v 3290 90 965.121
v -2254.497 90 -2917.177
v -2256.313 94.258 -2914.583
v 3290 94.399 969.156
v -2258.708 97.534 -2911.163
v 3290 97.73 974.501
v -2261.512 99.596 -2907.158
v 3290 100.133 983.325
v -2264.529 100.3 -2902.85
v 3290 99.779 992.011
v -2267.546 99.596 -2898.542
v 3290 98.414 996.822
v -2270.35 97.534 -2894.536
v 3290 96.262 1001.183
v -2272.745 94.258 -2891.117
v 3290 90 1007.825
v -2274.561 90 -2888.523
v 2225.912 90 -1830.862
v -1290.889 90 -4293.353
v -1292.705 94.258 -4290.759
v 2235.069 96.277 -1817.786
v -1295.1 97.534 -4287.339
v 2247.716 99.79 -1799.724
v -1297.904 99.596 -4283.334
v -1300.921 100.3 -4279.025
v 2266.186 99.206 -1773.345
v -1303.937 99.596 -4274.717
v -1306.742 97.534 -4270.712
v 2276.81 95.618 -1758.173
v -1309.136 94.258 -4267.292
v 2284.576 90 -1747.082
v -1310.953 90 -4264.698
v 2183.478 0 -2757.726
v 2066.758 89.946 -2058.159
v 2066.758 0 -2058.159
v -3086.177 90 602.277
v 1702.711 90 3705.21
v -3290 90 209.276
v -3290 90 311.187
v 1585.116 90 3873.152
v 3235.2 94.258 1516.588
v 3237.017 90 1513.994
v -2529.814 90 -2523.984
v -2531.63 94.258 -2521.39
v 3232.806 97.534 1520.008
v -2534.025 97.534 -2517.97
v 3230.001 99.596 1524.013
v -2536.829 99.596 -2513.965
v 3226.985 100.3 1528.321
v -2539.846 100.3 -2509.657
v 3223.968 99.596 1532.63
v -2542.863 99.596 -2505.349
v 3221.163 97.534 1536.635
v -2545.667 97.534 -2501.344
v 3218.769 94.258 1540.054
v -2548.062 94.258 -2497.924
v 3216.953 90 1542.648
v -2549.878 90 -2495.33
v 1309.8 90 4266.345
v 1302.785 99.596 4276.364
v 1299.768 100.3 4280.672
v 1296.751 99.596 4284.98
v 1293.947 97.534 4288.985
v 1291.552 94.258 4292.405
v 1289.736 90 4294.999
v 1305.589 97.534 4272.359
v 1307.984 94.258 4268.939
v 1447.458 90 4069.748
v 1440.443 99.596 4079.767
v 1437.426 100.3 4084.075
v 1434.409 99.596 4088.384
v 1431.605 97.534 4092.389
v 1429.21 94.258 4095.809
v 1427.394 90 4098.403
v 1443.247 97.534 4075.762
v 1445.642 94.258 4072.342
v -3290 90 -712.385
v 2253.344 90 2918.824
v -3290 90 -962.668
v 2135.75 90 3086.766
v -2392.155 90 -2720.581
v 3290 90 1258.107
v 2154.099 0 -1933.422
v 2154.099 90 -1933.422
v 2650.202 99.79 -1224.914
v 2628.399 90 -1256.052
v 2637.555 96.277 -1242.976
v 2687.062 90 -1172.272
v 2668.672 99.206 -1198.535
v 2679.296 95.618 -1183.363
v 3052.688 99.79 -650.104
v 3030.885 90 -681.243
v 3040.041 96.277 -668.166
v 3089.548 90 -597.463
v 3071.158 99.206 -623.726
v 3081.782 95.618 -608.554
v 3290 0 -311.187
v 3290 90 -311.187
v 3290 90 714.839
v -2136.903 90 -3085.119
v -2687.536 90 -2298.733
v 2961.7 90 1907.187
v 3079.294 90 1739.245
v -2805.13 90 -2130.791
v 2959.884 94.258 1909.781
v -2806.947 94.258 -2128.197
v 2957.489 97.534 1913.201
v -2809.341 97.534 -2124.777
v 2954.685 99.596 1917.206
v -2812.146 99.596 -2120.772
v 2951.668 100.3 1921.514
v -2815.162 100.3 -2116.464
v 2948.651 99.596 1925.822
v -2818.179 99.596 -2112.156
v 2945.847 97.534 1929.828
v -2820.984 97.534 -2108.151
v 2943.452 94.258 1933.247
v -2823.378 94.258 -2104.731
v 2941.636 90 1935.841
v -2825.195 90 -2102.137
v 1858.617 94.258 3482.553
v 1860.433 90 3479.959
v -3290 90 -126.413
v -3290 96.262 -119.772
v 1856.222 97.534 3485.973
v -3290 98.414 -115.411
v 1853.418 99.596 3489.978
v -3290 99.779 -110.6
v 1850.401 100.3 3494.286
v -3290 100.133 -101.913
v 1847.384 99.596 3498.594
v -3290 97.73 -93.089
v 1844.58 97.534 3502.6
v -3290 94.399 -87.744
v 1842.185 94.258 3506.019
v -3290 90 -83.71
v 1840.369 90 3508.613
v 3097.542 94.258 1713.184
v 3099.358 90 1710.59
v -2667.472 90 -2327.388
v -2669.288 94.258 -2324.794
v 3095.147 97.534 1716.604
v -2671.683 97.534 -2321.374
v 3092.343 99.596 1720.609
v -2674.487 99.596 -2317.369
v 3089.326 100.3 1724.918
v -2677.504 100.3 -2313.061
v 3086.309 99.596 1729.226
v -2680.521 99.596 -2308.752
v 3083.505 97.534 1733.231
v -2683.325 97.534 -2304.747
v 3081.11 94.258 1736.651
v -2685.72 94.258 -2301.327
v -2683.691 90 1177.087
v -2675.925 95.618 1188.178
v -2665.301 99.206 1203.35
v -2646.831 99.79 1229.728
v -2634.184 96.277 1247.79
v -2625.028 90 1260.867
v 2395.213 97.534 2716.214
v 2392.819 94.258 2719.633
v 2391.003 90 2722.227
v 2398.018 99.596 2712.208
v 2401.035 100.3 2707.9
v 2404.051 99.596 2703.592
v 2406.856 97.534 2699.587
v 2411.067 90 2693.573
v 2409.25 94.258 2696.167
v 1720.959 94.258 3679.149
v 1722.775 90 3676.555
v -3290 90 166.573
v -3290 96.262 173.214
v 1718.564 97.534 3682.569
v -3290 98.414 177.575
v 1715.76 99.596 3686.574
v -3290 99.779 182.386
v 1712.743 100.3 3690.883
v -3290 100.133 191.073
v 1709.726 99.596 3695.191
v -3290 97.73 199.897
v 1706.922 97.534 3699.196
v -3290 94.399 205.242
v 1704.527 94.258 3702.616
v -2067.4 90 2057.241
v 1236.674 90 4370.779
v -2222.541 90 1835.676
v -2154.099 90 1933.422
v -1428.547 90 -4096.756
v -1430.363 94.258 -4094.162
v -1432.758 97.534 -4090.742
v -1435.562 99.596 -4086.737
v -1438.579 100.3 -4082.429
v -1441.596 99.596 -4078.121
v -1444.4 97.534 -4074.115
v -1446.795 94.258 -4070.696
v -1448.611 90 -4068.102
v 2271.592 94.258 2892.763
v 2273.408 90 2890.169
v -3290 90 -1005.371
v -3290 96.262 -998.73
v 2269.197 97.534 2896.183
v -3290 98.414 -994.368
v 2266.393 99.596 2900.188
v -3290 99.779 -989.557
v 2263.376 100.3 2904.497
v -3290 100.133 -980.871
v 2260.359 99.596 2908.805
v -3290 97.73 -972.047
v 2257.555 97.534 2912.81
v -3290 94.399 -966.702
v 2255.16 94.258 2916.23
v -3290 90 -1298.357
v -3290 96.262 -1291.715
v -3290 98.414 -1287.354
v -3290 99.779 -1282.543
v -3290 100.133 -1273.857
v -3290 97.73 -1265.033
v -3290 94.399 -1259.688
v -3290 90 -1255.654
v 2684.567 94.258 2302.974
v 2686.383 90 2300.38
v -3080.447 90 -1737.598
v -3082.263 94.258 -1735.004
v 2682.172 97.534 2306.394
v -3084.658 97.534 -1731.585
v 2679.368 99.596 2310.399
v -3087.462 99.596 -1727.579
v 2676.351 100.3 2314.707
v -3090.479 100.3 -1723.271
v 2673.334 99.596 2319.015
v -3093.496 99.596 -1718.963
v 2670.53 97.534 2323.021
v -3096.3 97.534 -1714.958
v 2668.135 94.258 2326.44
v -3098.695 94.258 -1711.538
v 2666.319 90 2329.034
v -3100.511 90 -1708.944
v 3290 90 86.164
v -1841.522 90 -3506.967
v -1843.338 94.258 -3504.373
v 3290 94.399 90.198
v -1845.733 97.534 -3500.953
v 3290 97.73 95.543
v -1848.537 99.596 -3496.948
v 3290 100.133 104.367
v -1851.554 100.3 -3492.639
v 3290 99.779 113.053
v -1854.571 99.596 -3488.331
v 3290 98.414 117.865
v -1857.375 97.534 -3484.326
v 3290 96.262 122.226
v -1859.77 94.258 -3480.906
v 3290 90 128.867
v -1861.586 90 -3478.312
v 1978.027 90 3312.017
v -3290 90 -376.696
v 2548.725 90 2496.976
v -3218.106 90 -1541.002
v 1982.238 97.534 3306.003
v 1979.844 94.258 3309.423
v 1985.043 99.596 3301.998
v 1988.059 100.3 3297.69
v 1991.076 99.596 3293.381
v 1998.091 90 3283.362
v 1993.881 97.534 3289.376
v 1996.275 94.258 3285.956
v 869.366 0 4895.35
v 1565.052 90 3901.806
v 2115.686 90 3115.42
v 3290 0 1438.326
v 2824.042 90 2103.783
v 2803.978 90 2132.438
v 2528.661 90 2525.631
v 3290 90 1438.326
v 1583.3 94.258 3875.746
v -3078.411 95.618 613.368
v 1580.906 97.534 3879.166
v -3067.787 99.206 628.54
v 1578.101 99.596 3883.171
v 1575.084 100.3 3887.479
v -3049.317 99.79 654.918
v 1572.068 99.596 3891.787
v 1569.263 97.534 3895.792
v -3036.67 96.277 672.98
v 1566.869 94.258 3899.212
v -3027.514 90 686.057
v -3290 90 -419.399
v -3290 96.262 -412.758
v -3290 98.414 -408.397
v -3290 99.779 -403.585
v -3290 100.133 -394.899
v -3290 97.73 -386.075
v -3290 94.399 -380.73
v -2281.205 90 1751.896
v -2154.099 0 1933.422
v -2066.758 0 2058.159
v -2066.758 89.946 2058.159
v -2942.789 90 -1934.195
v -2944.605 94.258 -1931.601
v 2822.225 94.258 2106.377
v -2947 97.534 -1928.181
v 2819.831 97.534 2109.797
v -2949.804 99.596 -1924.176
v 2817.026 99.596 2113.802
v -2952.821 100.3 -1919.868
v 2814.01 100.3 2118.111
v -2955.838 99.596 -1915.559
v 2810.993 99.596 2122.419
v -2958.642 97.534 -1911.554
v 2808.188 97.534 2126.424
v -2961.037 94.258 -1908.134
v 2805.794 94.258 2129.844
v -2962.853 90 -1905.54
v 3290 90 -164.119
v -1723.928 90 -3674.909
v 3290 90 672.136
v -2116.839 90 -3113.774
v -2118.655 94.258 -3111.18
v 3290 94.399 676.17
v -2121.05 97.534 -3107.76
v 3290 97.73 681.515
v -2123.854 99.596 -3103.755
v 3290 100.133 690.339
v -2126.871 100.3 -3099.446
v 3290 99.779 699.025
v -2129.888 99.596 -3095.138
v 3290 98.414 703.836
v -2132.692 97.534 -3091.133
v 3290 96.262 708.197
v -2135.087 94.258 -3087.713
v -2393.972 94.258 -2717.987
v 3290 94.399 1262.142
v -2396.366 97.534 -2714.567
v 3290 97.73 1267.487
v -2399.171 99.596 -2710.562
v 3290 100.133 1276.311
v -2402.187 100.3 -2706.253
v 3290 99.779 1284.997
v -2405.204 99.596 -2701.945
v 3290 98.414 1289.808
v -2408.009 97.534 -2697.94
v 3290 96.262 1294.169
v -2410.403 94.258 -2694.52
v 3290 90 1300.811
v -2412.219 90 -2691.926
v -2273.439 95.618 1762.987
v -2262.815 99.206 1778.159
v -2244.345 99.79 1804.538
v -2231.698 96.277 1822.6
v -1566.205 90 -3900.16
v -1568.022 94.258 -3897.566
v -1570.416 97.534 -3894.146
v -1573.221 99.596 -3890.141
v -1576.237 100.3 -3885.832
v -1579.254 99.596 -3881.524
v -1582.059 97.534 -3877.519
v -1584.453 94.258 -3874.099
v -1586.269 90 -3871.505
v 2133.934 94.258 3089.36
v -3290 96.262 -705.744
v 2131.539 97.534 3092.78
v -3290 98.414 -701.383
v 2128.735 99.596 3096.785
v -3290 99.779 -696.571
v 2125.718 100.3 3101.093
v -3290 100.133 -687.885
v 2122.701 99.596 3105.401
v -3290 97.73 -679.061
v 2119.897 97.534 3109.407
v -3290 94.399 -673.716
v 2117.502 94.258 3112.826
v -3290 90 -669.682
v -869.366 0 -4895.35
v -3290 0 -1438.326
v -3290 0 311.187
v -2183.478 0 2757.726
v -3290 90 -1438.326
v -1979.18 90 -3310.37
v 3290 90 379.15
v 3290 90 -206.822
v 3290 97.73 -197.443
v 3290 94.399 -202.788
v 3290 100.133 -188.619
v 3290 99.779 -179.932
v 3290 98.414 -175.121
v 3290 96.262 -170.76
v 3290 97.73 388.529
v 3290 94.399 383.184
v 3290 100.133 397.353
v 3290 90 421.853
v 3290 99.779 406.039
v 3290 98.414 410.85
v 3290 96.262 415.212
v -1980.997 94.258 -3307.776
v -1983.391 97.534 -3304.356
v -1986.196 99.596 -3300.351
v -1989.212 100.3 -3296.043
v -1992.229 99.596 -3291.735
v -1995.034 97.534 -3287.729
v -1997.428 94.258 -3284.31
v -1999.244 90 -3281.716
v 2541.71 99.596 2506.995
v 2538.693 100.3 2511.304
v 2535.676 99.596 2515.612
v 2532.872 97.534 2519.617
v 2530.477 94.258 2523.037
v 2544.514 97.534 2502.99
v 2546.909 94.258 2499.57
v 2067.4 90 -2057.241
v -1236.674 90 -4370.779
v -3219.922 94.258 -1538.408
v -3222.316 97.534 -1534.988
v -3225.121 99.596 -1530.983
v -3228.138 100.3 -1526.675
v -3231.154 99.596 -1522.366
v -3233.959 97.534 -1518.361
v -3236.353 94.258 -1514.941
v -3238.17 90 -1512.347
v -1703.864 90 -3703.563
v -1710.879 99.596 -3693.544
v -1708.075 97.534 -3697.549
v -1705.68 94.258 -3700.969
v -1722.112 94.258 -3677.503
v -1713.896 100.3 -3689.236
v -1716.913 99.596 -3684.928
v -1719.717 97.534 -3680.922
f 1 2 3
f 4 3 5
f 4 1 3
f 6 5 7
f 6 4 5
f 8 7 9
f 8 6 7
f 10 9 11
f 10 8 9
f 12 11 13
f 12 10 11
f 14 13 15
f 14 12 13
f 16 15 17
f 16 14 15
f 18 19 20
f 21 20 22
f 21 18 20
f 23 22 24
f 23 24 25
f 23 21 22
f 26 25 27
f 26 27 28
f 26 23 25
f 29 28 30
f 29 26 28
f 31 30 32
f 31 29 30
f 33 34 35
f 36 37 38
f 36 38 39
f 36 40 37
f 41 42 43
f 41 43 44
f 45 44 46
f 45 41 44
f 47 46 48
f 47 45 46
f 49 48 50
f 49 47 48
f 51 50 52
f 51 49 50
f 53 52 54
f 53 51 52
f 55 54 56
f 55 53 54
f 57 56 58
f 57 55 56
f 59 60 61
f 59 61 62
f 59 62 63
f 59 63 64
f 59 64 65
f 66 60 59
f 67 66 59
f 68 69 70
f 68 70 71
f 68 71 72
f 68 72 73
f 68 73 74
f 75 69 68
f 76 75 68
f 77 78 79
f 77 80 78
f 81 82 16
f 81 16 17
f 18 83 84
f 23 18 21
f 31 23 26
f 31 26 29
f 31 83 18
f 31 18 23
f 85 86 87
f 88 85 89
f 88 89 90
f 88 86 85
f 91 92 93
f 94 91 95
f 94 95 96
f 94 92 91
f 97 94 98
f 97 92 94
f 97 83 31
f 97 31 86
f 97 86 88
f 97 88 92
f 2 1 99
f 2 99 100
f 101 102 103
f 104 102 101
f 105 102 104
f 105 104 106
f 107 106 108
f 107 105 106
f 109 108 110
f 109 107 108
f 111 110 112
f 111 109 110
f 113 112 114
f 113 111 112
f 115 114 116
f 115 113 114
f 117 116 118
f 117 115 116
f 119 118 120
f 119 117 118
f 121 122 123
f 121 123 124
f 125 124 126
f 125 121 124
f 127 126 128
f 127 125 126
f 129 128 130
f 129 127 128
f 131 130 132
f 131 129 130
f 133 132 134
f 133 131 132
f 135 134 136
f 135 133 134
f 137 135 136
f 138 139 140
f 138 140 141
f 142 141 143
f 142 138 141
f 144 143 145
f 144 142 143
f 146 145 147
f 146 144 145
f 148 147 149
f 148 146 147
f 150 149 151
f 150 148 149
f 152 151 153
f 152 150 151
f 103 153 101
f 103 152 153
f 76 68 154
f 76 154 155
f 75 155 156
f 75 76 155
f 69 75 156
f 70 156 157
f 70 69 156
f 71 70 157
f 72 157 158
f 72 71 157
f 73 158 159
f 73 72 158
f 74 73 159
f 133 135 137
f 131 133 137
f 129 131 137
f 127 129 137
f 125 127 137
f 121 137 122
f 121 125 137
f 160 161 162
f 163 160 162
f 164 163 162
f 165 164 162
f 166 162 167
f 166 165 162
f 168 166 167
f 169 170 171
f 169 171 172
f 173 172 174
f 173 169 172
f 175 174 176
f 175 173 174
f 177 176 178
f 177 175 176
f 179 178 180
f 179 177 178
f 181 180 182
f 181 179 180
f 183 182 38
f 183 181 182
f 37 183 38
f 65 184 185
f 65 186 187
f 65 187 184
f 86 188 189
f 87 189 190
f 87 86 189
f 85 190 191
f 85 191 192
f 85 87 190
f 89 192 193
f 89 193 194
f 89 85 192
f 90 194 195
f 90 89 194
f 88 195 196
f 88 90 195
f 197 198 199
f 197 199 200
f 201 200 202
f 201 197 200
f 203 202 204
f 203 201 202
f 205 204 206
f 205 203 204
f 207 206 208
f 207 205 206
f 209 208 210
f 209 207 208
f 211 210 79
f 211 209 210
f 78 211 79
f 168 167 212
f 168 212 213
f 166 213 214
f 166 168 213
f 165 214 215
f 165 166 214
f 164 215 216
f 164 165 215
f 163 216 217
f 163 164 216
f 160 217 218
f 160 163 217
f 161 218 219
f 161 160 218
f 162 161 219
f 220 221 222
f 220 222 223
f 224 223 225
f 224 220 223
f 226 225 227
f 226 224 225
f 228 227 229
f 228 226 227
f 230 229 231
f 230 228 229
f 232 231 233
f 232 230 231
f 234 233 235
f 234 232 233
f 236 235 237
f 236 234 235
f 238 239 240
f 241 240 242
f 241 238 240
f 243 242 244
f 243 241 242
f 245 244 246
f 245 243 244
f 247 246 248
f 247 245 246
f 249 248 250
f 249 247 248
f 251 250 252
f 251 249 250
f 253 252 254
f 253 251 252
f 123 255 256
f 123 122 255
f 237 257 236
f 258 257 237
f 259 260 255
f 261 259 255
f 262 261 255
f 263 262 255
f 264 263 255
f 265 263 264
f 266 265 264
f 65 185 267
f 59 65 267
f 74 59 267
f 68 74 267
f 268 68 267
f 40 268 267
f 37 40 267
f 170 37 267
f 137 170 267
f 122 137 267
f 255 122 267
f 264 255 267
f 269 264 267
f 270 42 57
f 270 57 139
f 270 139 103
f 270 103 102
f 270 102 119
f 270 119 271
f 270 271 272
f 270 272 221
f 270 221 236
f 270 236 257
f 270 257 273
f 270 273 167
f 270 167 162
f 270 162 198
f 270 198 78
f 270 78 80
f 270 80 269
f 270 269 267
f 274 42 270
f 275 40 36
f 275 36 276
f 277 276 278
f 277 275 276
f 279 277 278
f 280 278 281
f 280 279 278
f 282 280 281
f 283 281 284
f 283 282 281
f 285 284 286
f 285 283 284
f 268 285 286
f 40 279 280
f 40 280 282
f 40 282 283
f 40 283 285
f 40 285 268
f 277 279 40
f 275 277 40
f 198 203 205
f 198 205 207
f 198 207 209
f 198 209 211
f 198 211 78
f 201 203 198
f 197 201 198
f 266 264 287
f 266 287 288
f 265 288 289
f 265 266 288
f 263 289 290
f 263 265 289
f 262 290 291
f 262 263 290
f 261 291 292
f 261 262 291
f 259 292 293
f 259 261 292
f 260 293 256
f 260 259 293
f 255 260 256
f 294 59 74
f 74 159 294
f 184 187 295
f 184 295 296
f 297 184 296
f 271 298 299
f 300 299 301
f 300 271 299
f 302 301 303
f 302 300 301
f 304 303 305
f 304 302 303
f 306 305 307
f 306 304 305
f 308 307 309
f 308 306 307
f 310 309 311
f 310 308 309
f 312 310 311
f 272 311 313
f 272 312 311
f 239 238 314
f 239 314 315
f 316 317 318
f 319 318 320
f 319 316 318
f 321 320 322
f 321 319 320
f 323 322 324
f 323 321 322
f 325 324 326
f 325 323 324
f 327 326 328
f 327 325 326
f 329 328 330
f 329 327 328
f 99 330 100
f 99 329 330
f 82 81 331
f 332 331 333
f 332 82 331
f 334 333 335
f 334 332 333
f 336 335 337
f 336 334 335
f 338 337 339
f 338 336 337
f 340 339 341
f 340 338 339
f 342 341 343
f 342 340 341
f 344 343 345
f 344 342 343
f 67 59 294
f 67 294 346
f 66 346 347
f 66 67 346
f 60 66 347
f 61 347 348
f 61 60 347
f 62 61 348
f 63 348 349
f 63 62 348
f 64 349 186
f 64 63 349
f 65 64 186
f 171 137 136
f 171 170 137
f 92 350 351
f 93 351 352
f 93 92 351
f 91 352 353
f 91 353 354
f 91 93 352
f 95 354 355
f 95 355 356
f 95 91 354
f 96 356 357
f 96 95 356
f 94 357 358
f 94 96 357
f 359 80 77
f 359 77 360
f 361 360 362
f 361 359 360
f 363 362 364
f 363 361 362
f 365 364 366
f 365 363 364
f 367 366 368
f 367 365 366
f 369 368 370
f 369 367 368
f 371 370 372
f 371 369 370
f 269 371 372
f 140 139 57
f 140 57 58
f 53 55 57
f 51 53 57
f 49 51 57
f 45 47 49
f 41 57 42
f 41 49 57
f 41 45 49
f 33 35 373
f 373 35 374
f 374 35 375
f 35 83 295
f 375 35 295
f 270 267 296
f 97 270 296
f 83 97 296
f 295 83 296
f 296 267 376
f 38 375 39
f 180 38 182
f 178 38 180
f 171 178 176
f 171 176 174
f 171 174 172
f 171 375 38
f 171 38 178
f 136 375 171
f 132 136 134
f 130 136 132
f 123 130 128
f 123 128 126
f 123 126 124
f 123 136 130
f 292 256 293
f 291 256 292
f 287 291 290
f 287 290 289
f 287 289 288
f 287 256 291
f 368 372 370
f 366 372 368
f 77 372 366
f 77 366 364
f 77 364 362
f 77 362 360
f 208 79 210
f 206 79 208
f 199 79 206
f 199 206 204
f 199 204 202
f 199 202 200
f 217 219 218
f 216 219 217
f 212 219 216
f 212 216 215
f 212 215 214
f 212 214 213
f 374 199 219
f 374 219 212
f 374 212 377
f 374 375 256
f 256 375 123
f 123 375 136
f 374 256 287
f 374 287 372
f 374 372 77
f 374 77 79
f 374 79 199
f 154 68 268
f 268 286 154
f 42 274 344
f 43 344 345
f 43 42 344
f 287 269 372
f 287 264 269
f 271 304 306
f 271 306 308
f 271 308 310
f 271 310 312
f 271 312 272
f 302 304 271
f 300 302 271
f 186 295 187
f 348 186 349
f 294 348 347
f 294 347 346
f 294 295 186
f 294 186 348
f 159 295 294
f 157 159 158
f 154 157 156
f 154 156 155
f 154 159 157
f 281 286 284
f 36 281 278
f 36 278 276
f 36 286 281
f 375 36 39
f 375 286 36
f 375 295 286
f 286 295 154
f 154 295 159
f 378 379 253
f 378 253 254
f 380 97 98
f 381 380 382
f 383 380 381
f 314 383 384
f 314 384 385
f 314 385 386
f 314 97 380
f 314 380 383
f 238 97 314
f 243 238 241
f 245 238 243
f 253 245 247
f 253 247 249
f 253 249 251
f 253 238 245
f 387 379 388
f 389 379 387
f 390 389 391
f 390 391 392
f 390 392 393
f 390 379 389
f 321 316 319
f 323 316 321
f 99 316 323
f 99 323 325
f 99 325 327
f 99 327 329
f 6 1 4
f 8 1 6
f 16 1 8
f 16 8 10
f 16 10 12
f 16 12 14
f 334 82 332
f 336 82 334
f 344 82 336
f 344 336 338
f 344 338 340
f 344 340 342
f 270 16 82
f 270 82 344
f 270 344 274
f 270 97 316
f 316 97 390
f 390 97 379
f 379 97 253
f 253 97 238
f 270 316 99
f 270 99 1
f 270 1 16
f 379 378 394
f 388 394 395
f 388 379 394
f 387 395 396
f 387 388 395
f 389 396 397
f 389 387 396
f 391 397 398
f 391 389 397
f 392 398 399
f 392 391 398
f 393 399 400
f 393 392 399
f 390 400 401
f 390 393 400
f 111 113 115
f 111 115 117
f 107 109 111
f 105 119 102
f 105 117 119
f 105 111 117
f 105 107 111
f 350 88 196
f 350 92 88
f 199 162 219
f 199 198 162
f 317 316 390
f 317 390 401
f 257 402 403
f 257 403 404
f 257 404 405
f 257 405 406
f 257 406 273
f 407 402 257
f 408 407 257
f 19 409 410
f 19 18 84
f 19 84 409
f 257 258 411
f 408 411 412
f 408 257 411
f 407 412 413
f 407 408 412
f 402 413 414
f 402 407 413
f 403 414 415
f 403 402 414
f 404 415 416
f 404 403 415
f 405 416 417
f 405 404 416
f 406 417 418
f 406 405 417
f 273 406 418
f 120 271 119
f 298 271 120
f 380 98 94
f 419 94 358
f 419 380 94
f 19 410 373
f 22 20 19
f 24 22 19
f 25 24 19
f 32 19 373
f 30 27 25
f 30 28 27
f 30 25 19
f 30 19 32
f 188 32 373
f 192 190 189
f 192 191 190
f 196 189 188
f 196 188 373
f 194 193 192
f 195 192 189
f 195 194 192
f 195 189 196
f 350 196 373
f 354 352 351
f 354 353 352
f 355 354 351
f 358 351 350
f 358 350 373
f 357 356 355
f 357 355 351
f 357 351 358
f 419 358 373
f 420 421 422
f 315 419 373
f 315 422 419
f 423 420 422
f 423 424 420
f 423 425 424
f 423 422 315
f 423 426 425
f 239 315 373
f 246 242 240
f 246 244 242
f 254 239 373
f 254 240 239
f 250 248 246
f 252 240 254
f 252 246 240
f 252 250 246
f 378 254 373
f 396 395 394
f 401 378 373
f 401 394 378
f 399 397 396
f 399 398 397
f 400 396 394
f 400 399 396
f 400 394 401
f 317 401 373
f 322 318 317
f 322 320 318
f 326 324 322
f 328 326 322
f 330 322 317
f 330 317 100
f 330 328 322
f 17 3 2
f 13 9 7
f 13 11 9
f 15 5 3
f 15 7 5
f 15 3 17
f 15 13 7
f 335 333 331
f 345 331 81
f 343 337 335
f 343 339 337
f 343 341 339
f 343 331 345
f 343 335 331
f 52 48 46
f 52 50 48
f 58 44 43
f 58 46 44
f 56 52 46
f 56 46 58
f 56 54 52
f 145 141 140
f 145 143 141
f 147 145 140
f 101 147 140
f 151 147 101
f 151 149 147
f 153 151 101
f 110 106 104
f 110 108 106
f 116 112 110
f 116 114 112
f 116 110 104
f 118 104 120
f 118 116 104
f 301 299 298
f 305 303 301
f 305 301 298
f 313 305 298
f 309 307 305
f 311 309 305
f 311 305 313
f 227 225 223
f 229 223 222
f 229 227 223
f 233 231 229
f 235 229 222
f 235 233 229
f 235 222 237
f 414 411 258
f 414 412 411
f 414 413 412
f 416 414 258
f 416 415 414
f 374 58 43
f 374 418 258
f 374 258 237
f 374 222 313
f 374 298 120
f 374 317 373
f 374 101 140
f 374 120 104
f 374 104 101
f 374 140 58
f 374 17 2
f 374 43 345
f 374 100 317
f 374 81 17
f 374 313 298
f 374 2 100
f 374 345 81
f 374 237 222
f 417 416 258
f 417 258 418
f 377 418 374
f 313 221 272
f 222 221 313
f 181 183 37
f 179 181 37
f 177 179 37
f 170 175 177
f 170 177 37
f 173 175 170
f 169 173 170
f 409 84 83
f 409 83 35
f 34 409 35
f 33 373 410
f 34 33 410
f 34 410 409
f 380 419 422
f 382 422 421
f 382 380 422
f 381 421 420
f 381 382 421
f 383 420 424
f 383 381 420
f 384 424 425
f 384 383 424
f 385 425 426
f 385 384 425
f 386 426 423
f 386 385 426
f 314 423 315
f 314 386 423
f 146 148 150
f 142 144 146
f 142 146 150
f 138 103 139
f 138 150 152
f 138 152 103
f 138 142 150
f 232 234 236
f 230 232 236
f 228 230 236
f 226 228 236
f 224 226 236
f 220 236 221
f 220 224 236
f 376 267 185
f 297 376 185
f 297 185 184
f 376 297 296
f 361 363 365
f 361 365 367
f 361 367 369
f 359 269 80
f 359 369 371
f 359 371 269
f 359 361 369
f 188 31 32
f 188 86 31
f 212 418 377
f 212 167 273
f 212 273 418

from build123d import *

# Parameters (mm, degrees)
EXTRUDE_1_DEPTH          = 90
EXTRUDE_2_DEPTH          = 90
CUT_EXTRUDE_1_DEPTH      = 7594.314402262
PATTERN_CIRCULAR_2_COUNT = 2
SKETCH_9_R               = 20
EXTRUDE_3_DEPTH          = 8000
PATTERN_LINEAR_1_COUNT   = 24
PATTERN_LINEAR_1_PITCH   = 240
SKETCH_10_W              = 14000
SKETCH_10_H              = 14000
CUT_EXTRUDE_2_DEPTH      = 8000


with BuildPart() as part:
    # 草图2 → 凸台-拉伸1 (new body)
    with BuildSketch(Plane(origin=(0, 0, 0), x_dir=(1, 0, 0), z_dir=(0, 1, 0))):
        Polygon((-2614.527838122, 2403), (1483.472161878, 2403), (2154.099194276, 1933.421896588), (3290, 311.187425036), (3290, -1438.325778405), (2614.527838122, -2403), (-1483.472161878, -2403), (-2154.099194276, -1933.421896588), (-3290, -311.187425036), (-3290, 1438.325778405), align=None)
    extrude(amount=EXTRUDE_1_DEPTH)



with BuildPart() as body_2:
    # 草图5 → 凸台-拉伸2 (new body)
    with BuildSketch(Plane(origin=(0, 90, 0), x_dir=(1, 0, 0), z_dir=(0, 1, 0))):
        Polygon((1236.45451391, -4371.092671119), (2614.527838122, -2403), (-1483.472161878, -2403), (-2154.099194276, -1933.421896588), (-2066.757561129, -2058.158675872), align=None)
        Polygon((869.365594645, -4895.349979464), (1236.45451391, -4371.092671119), (-2066.757561129, -2058.158675872), (-2183.477702067, -2757.726090133), align=None)
    extrude(amount=-EXTRUDE_2_DEPTH)

    # 草图6 → 切除-拉伸1 (cut, through all)
    with BuildSketch(Plane(origin=(2883.415195897, 0, 2018.989055956), x_dir=(0.573576436, 0, -0.819152044), z_dir=(0.819152044, 0, 0.573576436))):
        Polygon((-3511.388323525, 0), (-2871.005048511, 90), (-3511.388323525, 90), align=None)
    extrude(amount=-CUT_EXTRUDE_1_DEPTH, mode=Mode.SUBTRACT)


with BuildPart() as pattern_circular_2_1:
    # 阵列(圆周)2: pattern copy
    add(body_2.part.rotate(Axis((0, 0, 0), (0, 1, 0)), 1 * 360 / PATTERN_CIRCULAR_2_COUNT))


with BuildPart() as part_1:
    add(part.part)

    add(body_2.part)  # 凸台-拉伸3 merges body 2
    # 草图9 → 凸台-拉伸3 (add)
    with BuildSketch(Plane(origin=(2883.415195897, 0, 2018.989055956), x_dir=(0.573576436, 0, -0.819152044), z_dir=(0.819152044, 0, 0.573576436))):
        with Locations((-2761.005048511, 80.3)):
            Circle(SKETCH_9_R)
    extrude_3 = extrude(amount=-EXTRUDE_3_DEPTH)


    add(pattern_circular_2_1.part)  # 阵列(线性)1 merges 阵列(圆周)2_1
    # 阵列(线性)1: 凸台-拉伸3 ×24
    with Locations(*[Vector(0.573576436, 0, -0.819152044) * (i * PATTERN_LINEAR_1_PITCH) for i in range(1, PATTERN_LINEAR_1_COUNT)]):
        add(extrude_3)

    # 草图10 → 切除-拉伸2 (cut)
    with BuildSketch(Plane.XZ):
        Rectangle(SKETCH_10_W, SKETCH_10_H)
        Polygon((2066.757561129, -2058.158675872), (3290, -311.187425036), (3290, 1438.325778405), (869.365594645, 4895.349979464), (-2183.477702067, 2757.726090133), (-2066.757561129, 2058.158675872), (-3290, 311.187425036), (-3290, -1438.325778405), (-869.365594645, -4895.349979464), (2183.477702067, -2757.726090133), align=None, mode=Mode.SUBTRACT)
    extrude(amount=-CUT_EXTRUDE_2_DEPTH, mode=Mode.SUBTRACT)


solid = part_1.part
